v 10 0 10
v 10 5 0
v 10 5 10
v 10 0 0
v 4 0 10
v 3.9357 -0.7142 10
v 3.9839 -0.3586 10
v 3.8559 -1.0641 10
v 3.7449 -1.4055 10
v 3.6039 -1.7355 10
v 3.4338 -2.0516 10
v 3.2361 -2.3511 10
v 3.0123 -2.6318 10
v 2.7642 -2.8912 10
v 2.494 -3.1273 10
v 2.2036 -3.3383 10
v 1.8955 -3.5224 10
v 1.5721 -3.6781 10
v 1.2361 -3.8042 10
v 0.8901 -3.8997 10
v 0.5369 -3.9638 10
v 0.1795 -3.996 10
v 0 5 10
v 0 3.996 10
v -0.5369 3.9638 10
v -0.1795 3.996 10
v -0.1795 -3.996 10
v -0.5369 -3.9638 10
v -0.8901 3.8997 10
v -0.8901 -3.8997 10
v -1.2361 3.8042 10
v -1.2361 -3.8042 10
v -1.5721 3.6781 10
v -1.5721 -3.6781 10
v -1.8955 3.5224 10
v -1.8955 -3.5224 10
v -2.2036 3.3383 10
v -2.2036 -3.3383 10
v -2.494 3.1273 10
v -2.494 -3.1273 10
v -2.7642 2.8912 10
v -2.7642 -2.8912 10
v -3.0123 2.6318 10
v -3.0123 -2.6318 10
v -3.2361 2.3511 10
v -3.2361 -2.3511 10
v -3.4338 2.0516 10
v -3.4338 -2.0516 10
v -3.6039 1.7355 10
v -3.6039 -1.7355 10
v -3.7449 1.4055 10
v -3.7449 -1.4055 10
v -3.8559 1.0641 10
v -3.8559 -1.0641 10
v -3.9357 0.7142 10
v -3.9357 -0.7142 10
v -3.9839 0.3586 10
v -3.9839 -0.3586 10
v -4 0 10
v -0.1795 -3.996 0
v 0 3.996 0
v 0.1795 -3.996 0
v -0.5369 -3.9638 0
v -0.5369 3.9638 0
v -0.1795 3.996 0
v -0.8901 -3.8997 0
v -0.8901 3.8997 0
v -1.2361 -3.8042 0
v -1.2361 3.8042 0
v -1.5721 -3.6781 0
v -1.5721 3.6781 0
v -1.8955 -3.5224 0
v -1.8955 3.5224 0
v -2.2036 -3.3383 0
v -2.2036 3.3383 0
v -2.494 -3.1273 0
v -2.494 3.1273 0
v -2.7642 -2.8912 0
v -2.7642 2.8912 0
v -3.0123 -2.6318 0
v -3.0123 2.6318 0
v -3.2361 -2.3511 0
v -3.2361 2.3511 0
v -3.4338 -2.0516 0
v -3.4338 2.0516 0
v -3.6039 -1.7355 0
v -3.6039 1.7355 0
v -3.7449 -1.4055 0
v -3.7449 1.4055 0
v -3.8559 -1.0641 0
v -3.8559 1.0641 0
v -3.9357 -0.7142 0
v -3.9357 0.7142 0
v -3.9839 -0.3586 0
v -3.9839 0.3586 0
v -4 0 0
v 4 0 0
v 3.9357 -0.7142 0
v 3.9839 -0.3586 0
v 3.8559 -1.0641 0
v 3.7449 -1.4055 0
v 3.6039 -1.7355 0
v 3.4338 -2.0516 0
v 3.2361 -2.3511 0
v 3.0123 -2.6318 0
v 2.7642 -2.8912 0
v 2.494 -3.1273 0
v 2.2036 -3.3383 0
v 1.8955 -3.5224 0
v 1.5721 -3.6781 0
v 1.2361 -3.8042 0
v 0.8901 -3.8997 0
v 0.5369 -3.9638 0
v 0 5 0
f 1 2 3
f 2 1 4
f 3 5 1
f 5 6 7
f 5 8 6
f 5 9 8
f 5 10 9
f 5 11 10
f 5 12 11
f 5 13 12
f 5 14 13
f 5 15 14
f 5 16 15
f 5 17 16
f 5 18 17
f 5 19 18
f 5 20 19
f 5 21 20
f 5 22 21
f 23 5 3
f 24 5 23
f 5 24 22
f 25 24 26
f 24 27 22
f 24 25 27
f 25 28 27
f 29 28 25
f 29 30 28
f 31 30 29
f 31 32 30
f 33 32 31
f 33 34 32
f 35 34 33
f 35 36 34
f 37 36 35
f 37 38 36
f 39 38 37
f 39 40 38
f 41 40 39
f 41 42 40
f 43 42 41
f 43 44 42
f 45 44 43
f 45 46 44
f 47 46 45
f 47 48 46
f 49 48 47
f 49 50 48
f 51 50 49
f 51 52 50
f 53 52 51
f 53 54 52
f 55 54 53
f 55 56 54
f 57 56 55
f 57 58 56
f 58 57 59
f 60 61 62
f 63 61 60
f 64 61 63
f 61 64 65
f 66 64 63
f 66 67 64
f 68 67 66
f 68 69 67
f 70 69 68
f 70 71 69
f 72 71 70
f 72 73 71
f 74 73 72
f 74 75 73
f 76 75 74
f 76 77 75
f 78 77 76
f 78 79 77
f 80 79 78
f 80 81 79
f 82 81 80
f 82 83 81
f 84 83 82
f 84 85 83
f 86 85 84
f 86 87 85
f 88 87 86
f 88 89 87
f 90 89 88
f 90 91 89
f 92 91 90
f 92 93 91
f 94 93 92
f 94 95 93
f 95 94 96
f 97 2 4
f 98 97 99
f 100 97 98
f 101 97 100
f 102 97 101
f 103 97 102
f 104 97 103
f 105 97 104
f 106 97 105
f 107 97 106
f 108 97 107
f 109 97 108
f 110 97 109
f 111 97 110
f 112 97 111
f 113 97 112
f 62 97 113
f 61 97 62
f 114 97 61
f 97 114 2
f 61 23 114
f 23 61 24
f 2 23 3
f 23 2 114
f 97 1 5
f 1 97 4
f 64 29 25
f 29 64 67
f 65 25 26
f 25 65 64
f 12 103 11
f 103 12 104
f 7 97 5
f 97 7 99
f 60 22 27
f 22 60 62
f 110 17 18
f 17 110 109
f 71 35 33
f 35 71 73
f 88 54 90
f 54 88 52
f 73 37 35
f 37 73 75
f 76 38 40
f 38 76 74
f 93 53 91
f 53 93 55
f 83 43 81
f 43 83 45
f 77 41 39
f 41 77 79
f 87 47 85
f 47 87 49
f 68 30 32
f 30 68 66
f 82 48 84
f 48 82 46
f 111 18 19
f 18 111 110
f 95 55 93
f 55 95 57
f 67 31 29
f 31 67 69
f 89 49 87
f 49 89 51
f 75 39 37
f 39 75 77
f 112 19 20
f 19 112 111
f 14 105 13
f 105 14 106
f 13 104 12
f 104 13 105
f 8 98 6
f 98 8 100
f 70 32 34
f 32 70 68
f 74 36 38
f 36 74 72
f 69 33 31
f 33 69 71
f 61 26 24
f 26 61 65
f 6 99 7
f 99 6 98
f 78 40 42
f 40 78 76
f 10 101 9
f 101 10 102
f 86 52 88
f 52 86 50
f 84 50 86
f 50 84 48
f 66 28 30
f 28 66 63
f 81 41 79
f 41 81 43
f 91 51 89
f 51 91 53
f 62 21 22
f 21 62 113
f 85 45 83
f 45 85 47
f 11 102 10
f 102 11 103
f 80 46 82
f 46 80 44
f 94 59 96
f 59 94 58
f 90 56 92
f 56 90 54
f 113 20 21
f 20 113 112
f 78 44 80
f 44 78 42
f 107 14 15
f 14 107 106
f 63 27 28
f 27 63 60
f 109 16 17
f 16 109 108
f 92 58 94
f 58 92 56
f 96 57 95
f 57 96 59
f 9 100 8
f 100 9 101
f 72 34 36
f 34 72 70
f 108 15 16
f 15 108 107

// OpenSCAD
// file: ../led-strip/led-strip.scad
function neonLikeLedStrip_width() = 6;

function neonLikeLedStrip_height() = 13;

module neonLikeLedStrip(length = 10)
{
    union()
    {
        color("white")
        cube([10,5,length]);
    
        color("green")
        cylinder(r = 4, h= length, $fn = 70);
    }
}
// file: ../neon-like-led-strip-pipe-fastener.scad
use <led-strip/led-strip.scad>;

module neonLikeLedStripPipeFastener(showLedStrip = false)
{
    if(showLedStrip)
    {
        neonLikeLedStrip();
    }
}
// main file
use <../neon-like-led-strip-pipe-fastener.scad>

neonLikeLedStripPipeFastener(showLedStrip = true);
